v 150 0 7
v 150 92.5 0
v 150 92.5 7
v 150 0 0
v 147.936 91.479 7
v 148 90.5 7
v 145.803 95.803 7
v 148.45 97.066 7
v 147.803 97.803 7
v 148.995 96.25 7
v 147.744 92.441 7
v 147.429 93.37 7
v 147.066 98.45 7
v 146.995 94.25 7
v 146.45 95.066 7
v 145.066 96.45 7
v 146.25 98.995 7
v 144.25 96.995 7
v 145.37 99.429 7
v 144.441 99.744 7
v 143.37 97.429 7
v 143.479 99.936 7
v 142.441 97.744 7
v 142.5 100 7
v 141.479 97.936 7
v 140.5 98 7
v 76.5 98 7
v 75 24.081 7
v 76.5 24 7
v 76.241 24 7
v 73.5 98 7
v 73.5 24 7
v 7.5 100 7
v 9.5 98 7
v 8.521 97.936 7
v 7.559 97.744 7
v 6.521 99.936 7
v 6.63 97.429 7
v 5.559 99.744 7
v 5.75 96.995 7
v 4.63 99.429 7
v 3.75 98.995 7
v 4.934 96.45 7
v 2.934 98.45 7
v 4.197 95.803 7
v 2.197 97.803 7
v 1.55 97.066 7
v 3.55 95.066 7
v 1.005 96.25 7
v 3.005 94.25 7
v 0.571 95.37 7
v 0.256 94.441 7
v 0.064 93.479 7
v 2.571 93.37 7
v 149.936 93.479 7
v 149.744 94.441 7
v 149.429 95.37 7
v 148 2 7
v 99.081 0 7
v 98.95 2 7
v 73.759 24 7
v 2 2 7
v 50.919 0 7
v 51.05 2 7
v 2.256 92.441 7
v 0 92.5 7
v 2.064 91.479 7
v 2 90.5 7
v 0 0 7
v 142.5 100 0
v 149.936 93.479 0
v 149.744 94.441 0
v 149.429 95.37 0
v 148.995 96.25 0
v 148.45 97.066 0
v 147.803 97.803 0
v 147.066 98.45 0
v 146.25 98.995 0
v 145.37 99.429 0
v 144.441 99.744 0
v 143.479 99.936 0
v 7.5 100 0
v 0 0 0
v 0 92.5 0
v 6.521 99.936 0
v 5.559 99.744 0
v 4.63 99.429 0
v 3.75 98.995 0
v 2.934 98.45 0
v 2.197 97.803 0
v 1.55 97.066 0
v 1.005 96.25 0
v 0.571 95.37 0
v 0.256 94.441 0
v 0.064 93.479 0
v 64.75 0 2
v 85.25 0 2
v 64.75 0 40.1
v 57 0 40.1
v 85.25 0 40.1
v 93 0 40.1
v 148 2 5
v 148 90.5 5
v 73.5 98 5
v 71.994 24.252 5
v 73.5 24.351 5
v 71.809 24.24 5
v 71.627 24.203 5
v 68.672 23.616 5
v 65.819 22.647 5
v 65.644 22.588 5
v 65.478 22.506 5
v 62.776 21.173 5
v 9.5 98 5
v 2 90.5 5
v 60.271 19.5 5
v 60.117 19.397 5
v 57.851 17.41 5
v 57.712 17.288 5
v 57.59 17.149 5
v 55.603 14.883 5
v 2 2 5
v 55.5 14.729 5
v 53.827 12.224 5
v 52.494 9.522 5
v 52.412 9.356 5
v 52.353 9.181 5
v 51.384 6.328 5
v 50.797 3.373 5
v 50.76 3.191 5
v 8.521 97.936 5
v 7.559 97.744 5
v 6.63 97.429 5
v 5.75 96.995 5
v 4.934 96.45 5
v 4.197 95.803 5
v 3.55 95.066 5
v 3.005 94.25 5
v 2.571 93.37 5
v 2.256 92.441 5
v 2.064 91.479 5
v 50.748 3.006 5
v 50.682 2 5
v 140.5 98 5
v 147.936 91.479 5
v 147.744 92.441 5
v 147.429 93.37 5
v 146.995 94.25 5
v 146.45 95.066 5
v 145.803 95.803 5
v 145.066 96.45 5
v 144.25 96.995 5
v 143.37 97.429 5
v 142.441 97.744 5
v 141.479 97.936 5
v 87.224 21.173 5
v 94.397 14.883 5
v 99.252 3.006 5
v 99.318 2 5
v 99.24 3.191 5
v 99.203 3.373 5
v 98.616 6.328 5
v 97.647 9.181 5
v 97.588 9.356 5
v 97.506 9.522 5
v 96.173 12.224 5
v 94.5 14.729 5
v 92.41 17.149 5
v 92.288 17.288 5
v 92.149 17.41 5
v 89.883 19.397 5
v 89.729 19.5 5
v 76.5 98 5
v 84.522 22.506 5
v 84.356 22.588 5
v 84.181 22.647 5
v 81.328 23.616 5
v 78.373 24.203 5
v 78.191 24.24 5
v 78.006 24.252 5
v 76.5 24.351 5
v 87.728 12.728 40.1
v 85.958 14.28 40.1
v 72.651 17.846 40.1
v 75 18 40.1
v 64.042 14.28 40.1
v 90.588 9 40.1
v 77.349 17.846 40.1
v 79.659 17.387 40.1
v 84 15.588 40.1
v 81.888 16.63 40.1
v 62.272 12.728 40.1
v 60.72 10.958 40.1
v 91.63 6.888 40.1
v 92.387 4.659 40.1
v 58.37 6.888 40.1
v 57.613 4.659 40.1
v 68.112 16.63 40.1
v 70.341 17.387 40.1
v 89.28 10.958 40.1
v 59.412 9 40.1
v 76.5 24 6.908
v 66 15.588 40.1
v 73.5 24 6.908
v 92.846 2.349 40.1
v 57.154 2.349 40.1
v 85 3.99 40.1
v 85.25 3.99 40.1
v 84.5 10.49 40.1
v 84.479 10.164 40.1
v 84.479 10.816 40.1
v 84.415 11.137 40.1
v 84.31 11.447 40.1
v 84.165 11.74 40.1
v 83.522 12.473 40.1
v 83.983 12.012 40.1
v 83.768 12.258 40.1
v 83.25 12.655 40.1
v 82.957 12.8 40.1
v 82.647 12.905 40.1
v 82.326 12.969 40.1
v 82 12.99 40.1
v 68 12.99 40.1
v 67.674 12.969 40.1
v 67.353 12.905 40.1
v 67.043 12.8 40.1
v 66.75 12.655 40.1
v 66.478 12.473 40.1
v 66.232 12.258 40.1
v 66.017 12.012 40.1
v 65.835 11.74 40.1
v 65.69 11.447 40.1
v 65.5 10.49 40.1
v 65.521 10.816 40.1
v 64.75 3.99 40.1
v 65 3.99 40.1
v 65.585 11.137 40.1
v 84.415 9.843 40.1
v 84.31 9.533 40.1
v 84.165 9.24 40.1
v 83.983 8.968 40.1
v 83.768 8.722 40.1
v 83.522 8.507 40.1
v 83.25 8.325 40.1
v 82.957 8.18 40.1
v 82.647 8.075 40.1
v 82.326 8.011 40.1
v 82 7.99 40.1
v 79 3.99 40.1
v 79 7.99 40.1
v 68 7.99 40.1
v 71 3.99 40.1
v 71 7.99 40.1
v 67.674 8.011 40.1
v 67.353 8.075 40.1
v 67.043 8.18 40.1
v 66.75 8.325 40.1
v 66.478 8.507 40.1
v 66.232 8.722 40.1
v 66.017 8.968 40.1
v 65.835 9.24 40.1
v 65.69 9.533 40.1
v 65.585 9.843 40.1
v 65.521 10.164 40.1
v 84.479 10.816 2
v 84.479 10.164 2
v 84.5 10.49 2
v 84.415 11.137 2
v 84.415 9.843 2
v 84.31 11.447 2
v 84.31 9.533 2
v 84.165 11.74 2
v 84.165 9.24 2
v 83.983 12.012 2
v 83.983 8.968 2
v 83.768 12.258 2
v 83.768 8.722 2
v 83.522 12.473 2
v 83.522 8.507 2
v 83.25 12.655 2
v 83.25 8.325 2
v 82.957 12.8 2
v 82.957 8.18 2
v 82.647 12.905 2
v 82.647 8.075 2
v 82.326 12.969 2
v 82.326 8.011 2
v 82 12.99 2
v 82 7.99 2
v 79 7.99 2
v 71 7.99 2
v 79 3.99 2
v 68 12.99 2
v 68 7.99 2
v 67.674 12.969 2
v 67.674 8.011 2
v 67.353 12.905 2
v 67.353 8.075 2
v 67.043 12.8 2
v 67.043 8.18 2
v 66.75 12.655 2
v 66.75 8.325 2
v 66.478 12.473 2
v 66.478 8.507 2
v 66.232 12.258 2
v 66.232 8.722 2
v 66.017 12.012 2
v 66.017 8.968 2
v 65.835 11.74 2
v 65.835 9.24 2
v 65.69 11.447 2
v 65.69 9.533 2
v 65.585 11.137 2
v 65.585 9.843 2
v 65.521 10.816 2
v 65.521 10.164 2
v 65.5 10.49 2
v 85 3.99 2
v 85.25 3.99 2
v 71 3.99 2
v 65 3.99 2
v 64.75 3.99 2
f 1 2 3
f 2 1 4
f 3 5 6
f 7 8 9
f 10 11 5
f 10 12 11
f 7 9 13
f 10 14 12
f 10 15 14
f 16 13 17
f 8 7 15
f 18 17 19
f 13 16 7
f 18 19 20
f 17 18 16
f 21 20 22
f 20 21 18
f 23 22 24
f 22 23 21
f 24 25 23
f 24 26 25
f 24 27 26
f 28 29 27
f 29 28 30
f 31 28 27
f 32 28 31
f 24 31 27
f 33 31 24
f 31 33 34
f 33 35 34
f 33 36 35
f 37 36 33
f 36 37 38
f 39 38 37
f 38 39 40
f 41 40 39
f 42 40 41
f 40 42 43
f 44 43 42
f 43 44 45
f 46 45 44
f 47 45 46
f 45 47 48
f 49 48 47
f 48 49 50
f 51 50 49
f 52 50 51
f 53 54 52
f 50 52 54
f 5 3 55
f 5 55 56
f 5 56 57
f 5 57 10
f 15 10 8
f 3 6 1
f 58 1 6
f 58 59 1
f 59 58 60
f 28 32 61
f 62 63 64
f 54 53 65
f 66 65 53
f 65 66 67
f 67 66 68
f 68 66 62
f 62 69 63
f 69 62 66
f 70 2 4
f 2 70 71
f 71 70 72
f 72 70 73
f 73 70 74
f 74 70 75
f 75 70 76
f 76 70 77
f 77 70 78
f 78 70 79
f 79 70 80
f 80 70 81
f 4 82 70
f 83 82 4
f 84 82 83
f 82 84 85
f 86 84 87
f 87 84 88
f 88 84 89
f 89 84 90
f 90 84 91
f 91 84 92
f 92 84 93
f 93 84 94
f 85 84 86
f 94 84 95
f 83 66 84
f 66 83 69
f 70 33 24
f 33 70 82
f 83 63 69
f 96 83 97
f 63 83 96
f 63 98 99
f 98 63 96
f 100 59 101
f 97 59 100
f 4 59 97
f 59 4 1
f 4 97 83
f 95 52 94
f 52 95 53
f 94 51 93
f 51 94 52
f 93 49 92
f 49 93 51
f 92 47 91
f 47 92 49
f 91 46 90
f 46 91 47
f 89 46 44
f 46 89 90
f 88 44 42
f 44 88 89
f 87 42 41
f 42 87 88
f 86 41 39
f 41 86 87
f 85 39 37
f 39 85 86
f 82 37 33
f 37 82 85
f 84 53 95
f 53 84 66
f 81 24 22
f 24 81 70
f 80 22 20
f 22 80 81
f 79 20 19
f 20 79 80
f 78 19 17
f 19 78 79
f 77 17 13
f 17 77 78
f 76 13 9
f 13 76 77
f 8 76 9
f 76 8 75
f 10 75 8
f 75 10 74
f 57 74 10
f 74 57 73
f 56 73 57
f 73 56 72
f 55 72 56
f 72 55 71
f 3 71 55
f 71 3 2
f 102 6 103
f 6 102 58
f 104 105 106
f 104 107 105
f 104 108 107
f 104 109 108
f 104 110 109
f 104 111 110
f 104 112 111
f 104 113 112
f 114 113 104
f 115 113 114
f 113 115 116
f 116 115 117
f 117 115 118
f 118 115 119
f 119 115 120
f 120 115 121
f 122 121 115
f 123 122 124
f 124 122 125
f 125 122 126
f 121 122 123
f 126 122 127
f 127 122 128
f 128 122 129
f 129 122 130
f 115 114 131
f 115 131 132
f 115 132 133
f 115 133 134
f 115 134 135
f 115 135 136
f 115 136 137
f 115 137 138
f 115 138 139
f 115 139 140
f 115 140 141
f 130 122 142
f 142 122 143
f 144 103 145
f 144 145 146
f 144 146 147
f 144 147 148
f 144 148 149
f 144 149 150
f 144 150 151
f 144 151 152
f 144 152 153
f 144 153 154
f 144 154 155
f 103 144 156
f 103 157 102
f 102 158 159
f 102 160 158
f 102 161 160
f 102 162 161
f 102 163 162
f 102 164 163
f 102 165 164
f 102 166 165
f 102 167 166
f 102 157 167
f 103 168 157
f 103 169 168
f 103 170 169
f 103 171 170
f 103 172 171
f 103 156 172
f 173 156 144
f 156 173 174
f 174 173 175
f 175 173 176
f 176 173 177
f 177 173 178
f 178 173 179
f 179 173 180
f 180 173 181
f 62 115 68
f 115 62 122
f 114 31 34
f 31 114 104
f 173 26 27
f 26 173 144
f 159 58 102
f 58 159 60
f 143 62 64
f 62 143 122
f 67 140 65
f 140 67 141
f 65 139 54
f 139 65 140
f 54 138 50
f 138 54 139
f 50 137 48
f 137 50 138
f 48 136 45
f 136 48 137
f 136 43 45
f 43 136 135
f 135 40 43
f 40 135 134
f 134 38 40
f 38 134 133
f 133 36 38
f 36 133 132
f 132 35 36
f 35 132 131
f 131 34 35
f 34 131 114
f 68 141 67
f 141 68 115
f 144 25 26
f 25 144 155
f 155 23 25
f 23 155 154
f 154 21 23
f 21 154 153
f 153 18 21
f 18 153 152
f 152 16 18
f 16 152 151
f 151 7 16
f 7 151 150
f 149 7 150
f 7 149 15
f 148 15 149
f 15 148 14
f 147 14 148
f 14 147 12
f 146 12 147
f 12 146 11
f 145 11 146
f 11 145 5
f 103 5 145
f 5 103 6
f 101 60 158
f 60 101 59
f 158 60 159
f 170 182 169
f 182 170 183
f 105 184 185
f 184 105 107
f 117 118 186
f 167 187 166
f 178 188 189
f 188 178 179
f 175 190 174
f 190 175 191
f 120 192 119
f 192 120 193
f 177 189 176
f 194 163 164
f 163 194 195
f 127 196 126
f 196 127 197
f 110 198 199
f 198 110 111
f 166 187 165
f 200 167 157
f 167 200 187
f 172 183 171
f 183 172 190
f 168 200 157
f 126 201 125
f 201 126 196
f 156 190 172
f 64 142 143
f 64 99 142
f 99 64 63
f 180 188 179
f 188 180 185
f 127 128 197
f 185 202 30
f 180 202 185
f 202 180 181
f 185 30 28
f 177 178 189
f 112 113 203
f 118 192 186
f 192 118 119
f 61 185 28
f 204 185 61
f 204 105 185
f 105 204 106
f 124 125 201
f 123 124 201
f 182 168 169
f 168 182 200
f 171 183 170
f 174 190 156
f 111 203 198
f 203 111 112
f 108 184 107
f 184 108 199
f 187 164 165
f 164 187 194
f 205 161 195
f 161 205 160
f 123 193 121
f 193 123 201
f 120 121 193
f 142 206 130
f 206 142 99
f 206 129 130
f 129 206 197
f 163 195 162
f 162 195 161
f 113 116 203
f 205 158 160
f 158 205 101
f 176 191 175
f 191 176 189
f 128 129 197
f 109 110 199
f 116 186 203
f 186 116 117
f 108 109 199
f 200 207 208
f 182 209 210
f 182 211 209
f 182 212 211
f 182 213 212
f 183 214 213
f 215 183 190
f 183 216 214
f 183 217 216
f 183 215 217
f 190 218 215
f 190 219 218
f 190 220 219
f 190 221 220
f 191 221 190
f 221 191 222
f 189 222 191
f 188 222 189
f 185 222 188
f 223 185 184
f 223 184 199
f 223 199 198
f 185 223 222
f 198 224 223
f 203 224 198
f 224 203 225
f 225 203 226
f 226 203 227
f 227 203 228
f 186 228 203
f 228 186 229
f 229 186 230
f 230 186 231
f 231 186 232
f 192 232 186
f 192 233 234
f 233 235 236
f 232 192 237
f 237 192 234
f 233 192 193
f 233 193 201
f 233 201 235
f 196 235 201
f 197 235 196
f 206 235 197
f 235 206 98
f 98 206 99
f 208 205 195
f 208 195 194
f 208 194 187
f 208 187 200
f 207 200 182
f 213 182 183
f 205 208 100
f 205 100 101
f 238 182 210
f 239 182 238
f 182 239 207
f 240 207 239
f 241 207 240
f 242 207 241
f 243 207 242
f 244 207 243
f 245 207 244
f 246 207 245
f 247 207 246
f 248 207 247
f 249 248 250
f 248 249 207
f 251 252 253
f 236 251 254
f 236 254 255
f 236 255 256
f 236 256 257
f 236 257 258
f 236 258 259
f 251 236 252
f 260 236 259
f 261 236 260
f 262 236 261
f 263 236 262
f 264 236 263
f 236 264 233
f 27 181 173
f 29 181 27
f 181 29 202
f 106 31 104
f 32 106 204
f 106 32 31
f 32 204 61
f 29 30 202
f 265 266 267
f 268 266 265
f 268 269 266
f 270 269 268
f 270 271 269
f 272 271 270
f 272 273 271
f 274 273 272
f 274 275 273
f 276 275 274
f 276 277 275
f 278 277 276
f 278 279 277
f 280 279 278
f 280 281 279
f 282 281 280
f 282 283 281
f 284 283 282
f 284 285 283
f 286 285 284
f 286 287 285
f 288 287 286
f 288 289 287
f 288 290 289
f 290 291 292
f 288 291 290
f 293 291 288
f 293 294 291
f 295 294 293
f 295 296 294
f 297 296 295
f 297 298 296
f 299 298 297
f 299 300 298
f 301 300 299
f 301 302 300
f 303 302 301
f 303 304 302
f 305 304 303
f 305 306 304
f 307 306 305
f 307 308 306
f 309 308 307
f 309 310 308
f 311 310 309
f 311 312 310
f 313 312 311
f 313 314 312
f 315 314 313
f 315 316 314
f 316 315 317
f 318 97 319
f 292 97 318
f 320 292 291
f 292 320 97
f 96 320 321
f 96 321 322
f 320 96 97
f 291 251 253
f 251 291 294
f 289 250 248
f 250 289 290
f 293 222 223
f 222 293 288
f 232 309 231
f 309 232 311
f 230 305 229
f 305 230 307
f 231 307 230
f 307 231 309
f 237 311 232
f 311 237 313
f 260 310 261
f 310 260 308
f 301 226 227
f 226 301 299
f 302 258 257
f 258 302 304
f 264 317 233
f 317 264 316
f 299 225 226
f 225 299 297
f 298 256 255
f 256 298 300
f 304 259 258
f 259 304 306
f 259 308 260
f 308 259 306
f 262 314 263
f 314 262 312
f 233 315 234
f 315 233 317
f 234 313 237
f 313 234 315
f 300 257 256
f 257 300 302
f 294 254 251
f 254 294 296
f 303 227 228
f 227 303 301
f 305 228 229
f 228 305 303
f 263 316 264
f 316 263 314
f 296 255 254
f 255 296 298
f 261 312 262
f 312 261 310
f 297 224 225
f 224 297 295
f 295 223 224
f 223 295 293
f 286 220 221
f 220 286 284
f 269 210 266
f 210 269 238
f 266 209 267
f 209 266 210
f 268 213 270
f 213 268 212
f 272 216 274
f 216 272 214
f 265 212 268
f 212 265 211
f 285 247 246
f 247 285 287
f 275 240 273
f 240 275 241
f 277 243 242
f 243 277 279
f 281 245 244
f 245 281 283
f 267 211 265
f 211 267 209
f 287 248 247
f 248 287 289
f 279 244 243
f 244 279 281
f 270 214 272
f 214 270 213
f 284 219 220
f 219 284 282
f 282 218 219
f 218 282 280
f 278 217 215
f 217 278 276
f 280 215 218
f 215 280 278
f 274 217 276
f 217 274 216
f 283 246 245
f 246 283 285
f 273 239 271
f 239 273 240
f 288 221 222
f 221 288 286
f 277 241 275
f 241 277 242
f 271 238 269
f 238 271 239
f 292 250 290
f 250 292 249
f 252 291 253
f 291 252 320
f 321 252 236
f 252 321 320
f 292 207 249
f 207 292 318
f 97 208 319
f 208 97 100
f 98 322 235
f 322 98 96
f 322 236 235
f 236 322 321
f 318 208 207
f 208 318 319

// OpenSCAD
// file: parts.scad
$fn=48;
width = 20; // width of wall backer
rdiff = 3;
rwidth = width-rdiff*2;
rdepth = 5;
cdiff = 6;
cwidth = width-cdiff*2;
cdepth = 4;
height = 1.5 * 25.4; // 1.5 inches


module rail() {
    // Make the main rail segment
    translate([rdiff,0,0])
        cube([rwidth, rdepth, height]);
    translate([rdiff,rdepth/2,0])
        cylinder(r=rdepth/2,height);
    translate([width-rdiff,rdepth/2,0])
        cylinder(r=rdepth/2,height);
    // Make the connection between the rail and the wall backer
    translate([cdiff, rdepth, 0])
        cube([cwidth, cdepth, height]);
    // Make the wall backer
    translate([0,rdepth+cdepth,0])
        cube([width, cdepth, height]);
}
// main file
include <parts.scad>
include <MCAD/2Dshapes.scad>

sw = 150;
sd = 100;
t = 5;
cr = 7.5;

module plate() {
    difference() {
        cube([sw,sd,t+2]);
        translate([cr,sd-cr,-0.01])
            linear_extrude(15) donutSlice(cr,cr*2, 90,180);
        translate([sw-cr,sd-cr,-0.01])
            linear_extrude(15) donutSlice(cr,cr*2, 0,90);
    }
}

module small_plate() {
    difference() {
        cube([sw-4,sd-4,t+2]);
        translate([cr,sd-4-cr,-0.01])
            linear_extrude(10) donutSlice(cr,cr*2, 90,180);
        translate([sw-4-cr,sd-4-cr,-0.01])
            linear_extrude(10) donutSlice(cr,cr*2, 0,90);
    }
}

module shelf() {
    difference() {
        plate();
        translate([2,2,t]) {
            small_plate();
        }
    }
    translate([sw/2-1.5,24,t])
        cube([3,sd-24,2]);
    translate([sw/2, 0, 2]) {
        intersection() {
            cylinder(r1 = 25, r2 = 18, h = height);
            translate([-25,0,0])
                cube([50, 25, height]);
        }
    }
}

difference() {
    shelf();
    color("yellow") translate([sw/2-4, -0.01, t-1.5])
        cube([8,10,2]);
    color("green") translate([sw/2-width/2, rdepth+cdepth*2-0.01, 2])
        mirror([0,1,0]) rail();
    color("red") translate([sw/2-width/2-0.25, -0.01, 2])
        cube([width+0.5,cdepth,height]);
}
